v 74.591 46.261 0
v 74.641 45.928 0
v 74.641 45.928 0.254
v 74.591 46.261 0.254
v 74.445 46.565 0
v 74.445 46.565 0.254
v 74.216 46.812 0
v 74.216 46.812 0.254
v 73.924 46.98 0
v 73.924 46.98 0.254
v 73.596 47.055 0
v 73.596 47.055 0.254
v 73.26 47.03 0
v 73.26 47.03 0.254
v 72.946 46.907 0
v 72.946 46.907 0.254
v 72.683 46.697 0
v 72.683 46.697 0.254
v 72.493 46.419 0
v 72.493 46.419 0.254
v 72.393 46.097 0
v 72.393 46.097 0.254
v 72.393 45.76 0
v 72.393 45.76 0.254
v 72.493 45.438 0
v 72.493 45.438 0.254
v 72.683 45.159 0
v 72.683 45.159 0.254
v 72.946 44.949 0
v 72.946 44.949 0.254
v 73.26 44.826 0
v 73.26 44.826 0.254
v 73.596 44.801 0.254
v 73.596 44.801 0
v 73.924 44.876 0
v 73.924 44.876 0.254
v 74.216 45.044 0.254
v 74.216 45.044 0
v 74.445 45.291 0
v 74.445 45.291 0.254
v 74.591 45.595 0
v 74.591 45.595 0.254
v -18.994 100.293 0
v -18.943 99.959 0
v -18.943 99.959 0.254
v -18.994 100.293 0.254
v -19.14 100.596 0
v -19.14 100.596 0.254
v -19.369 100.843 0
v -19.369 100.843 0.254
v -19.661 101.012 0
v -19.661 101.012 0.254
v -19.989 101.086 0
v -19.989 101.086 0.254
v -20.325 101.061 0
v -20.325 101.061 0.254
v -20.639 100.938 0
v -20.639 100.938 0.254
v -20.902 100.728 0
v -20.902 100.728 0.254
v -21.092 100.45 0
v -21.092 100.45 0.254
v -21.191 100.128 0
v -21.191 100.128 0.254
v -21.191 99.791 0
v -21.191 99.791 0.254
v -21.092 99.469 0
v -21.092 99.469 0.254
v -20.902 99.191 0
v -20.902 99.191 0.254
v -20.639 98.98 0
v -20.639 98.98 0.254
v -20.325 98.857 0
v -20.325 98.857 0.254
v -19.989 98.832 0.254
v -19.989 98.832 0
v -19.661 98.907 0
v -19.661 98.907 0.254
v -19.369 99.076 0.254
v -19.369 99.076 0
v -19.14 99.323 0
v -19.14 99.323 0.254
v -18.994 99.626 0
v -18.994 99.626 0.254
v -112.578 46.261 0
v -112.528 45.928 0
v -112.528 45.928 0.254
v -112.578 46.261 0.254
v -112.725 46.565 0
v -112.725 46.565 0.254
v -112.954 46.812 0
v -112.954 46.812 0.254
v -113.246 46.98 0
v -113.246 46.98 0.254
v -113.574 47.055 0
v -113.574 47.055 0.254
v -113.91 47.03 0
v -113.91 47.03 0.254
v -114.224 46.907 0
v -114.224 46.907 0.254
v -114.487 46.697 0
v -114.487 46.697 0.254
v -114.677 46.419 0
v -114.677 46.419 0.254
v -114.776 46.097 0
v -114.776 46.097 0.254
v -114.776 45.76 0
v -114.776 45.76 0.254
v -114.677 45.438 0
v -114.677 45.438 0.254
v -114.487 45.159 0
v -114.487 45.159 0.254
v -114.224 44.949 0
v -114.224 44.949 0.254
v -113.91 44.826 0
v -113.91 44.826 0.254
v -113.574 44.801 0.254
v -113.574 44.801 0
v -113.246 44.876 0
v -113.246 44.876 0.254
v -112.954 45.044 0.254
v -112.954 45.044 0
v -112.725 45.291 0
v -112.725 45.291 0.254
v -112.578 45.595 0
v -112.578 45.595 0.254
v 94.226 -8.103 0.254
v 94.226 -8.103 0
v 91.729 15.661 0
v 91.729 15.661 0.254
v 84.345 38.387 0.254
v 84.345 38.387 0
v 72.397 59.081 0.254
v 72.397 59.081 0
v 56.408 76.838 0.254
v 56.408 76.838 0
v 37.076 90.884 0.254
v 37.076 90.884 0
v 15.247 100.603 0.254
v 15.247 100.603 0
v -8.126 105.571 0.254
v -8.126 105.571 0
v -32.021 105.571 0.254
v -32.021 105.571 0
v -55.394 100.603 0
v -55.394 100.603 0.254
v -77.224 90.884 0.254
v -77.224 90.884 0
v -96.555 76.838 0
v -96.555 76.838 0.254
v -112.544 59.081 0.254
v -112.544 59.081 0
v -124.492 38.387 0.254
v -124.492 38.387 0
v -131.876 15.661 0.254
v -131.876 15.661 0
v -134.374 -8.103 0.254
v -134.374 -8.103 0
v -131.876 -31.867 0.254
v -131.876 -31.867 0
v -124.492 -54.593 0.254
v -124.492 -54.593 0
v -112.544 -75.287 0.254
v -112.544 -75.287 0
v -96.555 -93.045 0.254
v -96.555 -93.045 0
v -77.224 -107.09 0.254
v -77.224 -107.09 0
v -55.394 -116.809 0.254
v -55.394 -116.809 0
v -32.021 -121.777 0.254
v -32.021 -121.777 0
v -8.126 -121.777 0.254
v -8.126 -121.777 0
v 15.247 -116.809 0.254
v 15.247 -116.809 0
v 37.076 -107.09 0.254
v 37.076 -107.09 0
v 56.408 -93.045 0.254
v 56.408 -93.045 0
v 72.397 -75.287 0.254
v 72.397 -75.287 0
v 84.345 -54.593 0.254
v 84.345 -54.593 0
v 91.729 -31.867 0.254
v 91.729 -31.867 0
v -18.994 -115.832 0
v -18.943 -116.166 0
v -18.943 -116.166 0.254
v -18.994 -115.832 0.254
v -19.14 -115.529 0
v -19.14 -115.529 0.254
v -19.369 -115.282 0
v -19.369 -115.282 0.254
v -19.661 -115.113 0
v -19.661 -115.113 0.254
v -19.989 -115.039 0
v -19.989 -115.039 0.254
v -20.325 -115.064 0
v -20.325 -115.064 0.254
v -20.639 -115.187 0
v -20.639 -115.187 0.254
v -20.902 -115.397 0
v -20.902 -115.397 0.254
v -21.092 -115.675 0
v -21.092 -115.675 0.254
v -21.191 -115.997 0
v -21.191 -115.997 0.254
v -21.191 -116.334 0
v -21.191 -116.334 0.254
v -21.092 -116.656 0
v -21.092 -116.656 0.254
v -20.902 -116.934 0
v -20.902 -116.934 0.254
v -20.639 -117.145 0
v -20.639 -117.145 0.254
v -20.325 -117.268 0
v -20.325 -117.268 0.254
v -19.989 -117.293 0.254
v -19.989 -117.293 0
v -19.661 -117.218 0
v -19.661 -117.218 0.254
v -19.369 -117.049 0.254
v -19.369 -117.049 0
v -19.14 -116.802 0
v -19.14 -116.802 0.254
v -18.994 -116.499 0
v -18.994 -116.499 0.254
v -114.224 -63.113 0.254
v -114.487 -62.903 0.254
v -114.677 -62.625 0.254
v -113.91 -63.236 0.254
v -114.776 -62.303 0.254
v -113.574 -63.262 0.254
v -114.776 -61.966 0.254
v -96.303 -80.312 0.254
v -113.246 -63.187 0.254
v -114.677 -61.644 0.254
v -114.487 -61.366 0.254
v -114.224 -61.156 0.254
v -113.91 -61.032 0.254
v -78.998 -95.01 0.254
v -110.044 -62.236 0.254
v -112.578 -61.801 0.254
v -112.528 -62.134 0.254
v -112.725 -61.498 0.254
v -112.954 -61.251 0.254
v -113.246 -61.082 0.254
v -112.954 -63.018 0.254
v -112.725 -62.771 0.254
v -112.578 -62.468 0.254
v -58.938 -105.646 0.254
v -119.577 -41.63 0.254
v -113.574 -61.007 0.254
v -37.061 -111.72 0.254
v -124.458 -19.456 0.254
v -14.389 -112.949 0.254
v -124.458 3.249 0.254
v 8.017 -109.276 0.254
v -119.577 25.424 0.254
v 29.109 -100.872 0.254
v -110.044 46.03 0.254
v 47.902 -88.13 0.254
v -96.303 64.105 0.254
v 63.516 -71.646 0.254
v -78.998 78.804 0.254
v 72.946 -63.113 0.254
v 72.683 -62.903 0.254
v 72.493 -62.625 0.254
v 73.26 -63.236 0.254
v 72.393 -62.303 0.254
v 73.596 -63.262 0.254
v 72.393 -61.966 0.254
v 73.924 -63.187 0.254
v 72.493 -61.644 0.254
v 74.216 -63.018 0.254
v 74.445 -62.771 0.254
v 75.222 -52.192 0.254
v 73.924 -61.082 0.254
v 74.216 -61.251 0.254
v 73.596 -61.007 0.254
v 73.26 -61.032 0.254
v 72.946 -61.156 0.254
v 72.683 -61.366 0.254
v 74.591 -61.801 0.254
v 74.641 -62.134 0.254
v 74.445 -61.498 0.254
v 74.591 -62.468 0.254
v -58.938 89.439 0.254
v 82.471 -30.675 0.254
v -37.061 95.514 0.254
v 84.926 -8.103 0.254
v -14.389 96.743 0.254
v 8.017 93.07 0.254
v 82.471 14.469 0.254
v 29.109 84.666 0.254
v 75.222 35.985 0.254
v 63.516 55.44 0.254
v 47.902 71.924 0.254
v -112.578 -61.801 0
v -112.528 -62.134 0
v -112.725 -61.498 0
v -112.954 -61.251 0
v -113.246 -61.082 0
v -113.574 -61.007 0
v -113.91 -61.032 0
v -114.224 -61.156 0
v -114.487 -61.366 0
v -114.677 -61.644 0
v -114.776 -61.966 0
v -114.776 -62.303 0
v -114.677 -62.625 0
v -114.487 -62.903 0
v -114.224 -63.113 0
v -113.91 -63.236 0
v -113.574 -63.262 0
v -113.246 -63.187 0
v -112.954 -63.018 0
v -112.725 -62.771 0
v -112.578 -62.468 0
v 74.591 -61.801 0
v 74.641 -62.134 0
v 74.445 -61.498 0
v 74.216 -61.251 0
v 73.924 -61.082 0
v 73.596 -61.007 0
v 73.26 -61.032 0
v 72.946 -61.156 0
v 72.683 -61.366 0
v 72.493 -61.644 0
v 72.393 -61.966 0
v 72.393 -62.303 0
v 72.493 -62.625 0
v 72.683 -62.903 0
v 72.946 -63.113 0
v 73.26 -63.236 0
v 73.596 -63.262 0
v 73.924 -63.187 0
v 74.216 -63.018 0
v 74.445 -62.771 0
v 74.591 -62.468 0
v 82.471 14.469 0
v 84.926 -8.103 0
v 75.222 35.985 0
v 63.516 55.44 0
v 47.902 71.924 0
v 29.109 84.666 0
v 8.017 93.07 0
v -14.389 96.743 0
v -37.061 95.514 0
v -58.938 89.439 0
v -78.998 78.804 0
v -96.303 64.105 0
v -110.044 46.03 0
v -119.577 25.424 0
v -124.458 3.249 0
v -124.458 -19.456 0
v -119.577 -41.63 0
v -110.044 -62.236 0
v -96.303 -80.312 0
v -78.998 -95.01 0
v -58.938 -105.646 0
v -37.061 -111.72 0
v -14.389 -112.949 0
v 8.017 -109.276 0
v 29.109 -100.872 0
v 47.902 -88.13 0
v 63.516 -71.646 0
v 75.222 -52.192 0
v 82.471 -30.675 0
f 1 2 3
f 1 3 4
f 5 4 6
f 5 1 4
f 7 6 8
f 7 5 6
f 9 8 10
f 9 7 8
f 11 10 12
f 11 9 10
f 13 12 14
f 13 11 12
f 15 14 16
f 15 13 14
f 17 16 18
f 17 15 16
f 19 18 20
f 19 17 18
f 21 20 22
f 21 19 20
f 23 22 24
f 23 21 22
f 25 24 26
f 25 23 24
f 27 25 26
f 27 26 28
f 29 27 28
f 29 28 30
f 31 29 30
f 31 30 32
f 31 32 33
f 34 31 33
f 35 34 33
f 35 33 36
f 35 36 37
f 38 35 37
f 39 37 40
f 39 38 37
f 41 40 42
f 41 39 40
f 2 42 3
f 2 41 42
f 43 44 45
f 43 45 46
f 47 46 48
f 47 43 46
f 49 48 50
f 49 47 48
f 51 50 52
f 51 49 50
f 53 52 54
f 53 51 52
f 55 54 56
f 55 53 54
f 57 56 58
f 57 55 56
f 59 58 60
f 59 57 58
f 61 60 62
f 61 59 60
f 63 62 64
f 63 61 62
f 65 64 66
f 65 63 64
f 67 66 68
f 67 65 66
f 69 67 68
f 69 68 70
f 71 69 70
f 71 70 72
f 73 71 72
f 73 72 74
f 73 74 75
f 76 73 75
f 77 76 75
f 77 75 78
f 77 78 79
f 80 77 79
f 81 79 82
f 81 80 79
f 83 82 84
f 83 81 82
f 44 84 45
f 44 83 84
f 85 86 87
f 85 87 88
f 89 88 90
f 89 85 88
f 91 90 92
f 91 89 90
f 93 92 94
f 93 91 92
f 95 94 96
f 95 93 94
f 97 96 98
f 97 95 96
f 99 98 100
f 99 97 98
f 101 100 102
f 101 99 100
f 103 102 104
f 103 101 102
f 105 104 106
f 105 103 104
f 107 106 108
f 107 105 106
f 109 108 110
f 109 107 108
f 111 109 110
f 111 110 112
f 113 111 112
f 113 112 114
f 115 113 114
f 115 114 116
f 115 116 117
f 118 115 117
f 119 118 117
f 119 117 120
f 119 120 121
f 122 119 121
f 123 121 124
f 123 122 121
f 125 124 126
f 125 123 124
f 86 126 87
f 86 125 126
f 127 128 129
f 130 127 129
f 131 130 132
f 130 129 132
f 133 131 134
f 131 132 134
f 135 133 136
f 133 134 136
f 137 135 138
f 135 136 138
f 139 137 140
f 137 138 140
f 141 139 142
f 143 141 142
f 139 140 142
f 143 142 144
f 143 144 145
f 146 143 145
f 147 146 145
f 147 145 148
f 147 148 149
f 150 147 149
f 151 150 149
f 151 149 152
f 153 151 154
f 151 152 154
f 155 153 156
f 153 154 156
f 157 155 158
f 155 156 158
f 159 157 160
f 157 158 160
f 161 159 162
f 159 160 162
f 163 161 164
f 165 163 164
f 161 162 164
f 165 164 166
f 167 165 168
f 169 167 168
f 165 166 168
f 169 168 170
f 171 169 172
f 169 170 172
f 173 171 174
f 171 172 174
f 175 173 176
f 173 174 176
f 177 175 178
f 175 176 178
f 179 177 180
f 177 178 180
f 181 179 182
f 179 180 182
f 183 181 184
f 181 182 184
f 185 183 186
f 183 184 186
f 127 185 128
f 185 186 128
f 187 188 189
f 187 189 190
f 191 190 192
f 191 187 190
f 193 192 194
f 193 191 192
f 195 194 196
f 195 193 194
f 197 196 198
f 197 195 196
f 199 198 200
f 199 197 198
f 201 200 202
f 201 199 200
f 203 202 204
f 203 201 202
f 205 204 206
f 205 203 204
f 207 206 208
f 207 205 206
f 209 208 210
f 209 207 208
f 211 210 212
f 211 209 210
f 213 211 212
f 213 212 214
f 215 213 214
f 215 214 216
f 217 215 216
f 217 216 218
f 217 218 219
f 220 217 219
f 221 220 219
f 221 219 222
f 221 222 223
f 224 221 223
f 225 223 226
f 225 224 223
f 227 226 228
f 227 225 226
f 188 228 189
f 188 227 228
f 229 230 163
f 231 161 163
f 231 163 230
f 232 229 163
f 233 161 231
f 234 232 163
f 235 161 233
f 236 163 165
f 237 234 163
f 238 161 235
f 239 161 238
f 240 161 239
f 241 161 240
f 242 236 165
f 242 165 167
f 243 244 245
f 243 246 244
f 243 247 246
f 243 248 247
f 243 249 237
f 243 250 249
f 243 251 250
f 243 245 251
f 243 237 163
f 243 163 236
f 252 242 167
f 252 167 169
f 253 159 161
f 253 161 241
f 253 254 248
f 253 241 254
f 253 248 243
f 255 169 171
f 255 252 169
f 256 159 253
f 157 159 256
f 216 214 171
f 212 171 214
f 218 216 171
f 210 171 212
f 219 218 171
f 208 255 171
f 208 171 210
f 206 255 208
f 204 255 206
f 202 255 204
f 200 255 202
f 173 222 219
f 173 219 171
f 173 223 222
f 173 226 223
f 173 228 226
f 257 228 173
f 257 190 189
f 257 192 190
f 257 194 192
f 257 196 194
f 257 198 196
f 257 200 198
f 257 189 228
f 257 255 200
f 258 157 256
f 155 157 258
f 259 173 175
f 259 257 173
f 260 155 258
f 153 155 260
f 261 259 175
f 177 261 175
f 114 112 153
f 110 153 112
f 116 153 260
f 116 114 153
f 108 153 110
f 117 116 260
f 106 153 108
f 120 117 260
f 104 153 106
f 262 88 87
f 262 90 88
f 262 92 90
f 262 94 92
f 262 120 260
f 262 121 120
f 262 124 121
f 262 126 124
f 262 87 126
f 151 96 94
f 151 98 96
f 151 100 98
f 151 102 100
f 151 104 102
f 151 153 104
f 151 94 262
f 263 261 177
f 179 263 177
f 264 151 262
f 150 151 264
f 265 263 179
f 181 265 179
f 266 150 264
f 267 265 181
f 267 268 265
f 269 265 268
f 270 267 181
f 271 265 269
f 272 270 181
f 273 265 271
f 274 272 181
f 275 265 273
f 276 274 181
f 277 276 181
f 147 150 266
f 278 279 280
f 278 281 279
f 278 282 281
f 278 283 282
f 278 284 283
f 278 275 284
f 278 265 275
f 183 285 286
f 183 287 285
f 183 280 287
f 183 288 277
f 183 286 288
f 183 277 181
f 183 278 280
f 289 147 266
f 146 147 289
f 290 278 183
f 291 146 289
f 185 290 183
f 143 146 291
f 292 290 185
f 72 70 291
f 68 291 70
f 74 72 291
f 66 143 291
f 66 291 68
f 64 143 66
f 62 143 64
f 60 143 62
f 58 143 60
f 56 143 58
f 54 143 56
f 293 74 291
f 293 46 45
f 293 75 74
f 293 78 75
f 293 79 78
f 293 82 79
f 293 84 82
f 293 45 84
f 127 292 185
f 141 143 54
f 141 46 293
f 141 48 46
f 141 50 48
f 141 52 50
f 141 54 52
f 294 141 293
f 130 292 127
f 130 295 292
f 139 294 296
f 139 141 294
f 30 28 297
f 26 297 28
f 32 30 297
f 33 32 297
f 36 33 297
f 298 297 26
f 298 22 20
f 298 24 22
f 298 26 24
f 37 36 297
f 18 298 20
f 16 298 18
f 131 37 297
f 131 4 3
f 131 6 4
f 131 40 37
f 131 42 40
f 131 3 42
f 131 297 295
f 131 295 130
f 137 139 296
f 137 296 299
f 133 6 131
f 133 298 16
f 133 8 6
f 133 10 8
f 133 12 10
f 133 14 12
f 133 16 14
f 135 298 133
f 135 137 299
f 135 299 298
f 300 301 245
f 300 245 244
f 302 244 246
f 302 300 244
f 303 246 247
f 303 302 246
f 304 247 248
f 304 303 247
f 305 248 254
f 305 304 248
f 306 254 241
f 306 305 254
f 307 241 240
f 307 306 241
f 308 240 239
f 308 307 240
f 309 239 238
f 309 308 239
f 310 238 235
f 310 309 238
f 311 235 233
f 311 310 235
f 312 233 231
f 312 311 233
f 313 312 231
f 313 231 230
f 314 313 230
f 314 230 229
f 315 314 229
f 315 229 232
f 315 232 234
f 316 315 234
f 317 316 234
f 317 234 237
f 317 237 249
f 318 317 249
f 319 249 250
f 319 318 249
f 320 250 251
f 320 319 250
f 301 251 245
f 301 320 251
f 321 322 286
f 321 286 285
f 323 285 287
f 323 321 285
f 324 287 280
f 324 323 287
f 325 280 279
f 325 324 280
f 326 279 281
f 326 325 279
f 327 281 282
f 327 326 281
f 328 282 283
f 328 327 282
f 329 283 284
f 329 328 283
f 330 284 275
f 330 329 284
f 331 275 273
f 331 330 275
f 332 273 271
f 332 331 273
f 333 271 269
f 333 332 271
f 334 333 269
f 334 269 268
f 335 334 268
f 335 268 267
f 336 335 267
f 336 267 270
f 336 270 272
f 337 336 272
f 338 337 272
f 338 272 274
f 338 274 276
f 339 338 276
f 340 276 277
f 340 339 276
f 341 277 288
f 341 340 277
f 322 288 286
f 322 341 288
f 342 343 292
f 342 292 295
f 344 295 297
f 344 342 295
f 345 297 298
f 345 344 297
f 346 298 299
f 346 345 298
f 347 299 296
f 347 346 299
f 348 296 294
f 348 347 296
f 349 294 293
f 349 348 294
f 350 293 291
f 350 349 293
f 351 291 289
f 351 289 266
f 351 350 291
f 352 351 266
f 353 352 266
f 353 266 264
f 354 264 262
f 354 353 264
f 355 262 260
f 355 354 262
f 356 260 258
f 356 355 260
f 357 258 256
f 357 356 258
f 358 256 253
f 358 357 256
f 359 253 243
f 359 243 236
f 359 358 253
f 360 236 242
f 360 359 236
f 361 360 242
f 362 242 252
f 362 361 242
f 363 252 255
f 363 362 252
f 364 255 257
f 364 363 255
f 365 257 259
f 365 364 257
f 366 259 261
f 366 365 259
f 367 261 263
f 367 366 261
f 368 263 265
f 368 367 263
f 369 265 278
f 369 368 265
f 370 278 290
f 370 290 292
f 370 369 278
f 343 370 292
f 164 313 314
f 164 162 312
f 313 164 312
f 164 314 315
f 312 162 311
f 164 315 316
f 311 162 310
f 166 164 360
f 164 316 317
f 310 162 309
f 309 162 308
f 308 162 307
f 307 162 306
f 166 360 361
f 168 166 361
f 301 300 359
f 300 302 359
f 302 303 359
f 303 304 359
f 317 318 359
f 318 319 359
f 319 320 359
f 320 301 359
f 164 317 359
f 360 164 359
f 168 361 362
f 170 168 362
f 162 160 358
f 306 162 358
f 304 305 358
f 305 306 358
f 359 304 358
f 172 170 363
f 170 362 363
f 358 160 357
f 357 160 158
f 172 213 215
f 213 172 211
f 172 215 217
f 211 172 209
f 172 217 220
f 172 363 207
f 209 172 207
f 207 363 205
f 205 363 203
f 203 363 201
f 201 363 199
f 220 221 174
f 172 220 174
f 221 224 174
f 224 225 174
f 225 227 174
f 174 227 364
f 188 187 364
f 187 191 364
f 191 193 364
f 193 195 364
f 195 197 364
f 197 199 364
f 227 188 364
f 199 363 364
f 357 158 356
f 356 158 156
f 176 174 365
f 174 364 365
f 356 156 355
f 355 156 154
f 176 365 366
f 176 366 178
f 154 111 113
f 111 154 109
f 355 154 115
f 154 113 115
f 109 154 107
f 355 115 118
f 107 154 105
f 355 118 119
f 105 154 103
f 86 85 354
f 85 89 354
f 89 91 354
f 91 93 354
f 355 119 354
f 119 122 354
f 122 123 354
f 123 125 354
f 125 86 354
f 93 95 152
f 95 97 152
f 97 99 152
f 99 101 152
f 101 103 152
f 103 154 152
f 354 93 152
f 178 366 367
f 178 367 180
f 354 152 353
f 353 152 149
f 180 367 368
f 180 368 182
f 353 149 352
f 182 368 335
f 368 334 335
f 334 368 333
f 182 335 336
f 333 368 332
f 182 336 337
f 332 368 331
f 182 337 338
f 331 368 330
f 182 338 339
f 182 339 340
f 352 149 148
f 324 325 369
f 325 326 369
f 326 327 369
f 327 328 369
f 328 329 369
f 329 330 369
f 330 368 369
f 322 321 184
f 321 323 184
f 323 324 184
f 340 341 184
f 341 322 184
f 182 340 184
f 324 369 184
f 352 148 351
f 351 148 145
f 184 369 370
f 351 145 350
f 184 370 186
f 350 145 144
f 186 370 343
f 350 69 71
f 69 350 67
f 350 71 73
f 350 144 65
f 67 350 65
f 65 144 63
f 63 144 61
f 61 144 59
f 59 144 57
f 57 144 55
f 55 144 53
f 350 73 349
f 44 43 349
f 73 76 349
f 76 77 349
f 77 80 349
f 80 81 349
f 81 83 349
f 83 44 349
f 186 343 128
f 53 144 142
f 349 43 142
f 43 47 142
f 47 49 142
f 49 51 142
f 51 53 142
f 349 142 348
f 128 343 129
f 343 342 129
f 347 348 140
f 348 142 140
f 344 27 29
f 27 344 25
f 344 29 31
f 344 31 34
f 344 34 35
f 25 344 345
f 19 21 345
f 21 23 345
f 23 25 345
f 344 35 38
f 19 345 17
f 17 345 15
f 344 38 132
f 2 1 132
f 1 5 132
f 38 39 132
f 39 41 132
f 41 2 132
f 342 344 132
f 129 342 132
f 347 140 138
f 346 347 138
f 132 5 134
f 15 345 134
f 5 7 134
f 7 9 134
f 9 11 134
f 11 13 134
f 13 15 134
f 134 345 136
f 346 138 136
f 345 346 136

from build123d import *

# Parameters (mm, degrees)
SKETCH1_R           = 114.3
SKETCH1_R_2         = 1.1303
SKETCH1_R_3         = 105
BOSS_EXTRUDE1_DEPTH = 0.254


with BuildPart() as part:
    # Sketch1 → Boss-Extrude1 (new body)
    with BuildSketch(Plane.XY):
        with Locations((-20.073709177, -8.103148659)):
            Circle(SKETCH1_R)
        with Locations((-113.658579374, -62.134398659)):
            Circle(SKETCH1_R_2, mode=Mode.SUBTRACT)
        with Locations((-20.073709177, -116.165648659)):
            Circle(SKETCH1_R_2, mode=Mode.SUBTRACT)
        with Locations((73.511161019, -62.134398659)):
            Circle(SKETCH1_R_2, mode=Mode.SUBTRACT)
        with Locations((73.511161019, 45.928101341)):
            Circle(SKETCH1_R_2, mode=Mode.SUBTRACT)
        with Locations((-20.073709177, 99.959351341)):
            Circle(SKETCH1_R_2, mode=Mode.SUBTRACT)
        with Locations((-20.073709177, -8.103148659)):
            Circle(SKETCH1_R_3, mode=Mode.SUBTRACT)
        with Locations((-113.658579374, 45.928101341)):
            Circle(SKETCH1_R_2, mode=Mode.SUBTRACT)
    extrude(amount=BOSS_EXTRUDE1_DEPTH)


solid = part.part
